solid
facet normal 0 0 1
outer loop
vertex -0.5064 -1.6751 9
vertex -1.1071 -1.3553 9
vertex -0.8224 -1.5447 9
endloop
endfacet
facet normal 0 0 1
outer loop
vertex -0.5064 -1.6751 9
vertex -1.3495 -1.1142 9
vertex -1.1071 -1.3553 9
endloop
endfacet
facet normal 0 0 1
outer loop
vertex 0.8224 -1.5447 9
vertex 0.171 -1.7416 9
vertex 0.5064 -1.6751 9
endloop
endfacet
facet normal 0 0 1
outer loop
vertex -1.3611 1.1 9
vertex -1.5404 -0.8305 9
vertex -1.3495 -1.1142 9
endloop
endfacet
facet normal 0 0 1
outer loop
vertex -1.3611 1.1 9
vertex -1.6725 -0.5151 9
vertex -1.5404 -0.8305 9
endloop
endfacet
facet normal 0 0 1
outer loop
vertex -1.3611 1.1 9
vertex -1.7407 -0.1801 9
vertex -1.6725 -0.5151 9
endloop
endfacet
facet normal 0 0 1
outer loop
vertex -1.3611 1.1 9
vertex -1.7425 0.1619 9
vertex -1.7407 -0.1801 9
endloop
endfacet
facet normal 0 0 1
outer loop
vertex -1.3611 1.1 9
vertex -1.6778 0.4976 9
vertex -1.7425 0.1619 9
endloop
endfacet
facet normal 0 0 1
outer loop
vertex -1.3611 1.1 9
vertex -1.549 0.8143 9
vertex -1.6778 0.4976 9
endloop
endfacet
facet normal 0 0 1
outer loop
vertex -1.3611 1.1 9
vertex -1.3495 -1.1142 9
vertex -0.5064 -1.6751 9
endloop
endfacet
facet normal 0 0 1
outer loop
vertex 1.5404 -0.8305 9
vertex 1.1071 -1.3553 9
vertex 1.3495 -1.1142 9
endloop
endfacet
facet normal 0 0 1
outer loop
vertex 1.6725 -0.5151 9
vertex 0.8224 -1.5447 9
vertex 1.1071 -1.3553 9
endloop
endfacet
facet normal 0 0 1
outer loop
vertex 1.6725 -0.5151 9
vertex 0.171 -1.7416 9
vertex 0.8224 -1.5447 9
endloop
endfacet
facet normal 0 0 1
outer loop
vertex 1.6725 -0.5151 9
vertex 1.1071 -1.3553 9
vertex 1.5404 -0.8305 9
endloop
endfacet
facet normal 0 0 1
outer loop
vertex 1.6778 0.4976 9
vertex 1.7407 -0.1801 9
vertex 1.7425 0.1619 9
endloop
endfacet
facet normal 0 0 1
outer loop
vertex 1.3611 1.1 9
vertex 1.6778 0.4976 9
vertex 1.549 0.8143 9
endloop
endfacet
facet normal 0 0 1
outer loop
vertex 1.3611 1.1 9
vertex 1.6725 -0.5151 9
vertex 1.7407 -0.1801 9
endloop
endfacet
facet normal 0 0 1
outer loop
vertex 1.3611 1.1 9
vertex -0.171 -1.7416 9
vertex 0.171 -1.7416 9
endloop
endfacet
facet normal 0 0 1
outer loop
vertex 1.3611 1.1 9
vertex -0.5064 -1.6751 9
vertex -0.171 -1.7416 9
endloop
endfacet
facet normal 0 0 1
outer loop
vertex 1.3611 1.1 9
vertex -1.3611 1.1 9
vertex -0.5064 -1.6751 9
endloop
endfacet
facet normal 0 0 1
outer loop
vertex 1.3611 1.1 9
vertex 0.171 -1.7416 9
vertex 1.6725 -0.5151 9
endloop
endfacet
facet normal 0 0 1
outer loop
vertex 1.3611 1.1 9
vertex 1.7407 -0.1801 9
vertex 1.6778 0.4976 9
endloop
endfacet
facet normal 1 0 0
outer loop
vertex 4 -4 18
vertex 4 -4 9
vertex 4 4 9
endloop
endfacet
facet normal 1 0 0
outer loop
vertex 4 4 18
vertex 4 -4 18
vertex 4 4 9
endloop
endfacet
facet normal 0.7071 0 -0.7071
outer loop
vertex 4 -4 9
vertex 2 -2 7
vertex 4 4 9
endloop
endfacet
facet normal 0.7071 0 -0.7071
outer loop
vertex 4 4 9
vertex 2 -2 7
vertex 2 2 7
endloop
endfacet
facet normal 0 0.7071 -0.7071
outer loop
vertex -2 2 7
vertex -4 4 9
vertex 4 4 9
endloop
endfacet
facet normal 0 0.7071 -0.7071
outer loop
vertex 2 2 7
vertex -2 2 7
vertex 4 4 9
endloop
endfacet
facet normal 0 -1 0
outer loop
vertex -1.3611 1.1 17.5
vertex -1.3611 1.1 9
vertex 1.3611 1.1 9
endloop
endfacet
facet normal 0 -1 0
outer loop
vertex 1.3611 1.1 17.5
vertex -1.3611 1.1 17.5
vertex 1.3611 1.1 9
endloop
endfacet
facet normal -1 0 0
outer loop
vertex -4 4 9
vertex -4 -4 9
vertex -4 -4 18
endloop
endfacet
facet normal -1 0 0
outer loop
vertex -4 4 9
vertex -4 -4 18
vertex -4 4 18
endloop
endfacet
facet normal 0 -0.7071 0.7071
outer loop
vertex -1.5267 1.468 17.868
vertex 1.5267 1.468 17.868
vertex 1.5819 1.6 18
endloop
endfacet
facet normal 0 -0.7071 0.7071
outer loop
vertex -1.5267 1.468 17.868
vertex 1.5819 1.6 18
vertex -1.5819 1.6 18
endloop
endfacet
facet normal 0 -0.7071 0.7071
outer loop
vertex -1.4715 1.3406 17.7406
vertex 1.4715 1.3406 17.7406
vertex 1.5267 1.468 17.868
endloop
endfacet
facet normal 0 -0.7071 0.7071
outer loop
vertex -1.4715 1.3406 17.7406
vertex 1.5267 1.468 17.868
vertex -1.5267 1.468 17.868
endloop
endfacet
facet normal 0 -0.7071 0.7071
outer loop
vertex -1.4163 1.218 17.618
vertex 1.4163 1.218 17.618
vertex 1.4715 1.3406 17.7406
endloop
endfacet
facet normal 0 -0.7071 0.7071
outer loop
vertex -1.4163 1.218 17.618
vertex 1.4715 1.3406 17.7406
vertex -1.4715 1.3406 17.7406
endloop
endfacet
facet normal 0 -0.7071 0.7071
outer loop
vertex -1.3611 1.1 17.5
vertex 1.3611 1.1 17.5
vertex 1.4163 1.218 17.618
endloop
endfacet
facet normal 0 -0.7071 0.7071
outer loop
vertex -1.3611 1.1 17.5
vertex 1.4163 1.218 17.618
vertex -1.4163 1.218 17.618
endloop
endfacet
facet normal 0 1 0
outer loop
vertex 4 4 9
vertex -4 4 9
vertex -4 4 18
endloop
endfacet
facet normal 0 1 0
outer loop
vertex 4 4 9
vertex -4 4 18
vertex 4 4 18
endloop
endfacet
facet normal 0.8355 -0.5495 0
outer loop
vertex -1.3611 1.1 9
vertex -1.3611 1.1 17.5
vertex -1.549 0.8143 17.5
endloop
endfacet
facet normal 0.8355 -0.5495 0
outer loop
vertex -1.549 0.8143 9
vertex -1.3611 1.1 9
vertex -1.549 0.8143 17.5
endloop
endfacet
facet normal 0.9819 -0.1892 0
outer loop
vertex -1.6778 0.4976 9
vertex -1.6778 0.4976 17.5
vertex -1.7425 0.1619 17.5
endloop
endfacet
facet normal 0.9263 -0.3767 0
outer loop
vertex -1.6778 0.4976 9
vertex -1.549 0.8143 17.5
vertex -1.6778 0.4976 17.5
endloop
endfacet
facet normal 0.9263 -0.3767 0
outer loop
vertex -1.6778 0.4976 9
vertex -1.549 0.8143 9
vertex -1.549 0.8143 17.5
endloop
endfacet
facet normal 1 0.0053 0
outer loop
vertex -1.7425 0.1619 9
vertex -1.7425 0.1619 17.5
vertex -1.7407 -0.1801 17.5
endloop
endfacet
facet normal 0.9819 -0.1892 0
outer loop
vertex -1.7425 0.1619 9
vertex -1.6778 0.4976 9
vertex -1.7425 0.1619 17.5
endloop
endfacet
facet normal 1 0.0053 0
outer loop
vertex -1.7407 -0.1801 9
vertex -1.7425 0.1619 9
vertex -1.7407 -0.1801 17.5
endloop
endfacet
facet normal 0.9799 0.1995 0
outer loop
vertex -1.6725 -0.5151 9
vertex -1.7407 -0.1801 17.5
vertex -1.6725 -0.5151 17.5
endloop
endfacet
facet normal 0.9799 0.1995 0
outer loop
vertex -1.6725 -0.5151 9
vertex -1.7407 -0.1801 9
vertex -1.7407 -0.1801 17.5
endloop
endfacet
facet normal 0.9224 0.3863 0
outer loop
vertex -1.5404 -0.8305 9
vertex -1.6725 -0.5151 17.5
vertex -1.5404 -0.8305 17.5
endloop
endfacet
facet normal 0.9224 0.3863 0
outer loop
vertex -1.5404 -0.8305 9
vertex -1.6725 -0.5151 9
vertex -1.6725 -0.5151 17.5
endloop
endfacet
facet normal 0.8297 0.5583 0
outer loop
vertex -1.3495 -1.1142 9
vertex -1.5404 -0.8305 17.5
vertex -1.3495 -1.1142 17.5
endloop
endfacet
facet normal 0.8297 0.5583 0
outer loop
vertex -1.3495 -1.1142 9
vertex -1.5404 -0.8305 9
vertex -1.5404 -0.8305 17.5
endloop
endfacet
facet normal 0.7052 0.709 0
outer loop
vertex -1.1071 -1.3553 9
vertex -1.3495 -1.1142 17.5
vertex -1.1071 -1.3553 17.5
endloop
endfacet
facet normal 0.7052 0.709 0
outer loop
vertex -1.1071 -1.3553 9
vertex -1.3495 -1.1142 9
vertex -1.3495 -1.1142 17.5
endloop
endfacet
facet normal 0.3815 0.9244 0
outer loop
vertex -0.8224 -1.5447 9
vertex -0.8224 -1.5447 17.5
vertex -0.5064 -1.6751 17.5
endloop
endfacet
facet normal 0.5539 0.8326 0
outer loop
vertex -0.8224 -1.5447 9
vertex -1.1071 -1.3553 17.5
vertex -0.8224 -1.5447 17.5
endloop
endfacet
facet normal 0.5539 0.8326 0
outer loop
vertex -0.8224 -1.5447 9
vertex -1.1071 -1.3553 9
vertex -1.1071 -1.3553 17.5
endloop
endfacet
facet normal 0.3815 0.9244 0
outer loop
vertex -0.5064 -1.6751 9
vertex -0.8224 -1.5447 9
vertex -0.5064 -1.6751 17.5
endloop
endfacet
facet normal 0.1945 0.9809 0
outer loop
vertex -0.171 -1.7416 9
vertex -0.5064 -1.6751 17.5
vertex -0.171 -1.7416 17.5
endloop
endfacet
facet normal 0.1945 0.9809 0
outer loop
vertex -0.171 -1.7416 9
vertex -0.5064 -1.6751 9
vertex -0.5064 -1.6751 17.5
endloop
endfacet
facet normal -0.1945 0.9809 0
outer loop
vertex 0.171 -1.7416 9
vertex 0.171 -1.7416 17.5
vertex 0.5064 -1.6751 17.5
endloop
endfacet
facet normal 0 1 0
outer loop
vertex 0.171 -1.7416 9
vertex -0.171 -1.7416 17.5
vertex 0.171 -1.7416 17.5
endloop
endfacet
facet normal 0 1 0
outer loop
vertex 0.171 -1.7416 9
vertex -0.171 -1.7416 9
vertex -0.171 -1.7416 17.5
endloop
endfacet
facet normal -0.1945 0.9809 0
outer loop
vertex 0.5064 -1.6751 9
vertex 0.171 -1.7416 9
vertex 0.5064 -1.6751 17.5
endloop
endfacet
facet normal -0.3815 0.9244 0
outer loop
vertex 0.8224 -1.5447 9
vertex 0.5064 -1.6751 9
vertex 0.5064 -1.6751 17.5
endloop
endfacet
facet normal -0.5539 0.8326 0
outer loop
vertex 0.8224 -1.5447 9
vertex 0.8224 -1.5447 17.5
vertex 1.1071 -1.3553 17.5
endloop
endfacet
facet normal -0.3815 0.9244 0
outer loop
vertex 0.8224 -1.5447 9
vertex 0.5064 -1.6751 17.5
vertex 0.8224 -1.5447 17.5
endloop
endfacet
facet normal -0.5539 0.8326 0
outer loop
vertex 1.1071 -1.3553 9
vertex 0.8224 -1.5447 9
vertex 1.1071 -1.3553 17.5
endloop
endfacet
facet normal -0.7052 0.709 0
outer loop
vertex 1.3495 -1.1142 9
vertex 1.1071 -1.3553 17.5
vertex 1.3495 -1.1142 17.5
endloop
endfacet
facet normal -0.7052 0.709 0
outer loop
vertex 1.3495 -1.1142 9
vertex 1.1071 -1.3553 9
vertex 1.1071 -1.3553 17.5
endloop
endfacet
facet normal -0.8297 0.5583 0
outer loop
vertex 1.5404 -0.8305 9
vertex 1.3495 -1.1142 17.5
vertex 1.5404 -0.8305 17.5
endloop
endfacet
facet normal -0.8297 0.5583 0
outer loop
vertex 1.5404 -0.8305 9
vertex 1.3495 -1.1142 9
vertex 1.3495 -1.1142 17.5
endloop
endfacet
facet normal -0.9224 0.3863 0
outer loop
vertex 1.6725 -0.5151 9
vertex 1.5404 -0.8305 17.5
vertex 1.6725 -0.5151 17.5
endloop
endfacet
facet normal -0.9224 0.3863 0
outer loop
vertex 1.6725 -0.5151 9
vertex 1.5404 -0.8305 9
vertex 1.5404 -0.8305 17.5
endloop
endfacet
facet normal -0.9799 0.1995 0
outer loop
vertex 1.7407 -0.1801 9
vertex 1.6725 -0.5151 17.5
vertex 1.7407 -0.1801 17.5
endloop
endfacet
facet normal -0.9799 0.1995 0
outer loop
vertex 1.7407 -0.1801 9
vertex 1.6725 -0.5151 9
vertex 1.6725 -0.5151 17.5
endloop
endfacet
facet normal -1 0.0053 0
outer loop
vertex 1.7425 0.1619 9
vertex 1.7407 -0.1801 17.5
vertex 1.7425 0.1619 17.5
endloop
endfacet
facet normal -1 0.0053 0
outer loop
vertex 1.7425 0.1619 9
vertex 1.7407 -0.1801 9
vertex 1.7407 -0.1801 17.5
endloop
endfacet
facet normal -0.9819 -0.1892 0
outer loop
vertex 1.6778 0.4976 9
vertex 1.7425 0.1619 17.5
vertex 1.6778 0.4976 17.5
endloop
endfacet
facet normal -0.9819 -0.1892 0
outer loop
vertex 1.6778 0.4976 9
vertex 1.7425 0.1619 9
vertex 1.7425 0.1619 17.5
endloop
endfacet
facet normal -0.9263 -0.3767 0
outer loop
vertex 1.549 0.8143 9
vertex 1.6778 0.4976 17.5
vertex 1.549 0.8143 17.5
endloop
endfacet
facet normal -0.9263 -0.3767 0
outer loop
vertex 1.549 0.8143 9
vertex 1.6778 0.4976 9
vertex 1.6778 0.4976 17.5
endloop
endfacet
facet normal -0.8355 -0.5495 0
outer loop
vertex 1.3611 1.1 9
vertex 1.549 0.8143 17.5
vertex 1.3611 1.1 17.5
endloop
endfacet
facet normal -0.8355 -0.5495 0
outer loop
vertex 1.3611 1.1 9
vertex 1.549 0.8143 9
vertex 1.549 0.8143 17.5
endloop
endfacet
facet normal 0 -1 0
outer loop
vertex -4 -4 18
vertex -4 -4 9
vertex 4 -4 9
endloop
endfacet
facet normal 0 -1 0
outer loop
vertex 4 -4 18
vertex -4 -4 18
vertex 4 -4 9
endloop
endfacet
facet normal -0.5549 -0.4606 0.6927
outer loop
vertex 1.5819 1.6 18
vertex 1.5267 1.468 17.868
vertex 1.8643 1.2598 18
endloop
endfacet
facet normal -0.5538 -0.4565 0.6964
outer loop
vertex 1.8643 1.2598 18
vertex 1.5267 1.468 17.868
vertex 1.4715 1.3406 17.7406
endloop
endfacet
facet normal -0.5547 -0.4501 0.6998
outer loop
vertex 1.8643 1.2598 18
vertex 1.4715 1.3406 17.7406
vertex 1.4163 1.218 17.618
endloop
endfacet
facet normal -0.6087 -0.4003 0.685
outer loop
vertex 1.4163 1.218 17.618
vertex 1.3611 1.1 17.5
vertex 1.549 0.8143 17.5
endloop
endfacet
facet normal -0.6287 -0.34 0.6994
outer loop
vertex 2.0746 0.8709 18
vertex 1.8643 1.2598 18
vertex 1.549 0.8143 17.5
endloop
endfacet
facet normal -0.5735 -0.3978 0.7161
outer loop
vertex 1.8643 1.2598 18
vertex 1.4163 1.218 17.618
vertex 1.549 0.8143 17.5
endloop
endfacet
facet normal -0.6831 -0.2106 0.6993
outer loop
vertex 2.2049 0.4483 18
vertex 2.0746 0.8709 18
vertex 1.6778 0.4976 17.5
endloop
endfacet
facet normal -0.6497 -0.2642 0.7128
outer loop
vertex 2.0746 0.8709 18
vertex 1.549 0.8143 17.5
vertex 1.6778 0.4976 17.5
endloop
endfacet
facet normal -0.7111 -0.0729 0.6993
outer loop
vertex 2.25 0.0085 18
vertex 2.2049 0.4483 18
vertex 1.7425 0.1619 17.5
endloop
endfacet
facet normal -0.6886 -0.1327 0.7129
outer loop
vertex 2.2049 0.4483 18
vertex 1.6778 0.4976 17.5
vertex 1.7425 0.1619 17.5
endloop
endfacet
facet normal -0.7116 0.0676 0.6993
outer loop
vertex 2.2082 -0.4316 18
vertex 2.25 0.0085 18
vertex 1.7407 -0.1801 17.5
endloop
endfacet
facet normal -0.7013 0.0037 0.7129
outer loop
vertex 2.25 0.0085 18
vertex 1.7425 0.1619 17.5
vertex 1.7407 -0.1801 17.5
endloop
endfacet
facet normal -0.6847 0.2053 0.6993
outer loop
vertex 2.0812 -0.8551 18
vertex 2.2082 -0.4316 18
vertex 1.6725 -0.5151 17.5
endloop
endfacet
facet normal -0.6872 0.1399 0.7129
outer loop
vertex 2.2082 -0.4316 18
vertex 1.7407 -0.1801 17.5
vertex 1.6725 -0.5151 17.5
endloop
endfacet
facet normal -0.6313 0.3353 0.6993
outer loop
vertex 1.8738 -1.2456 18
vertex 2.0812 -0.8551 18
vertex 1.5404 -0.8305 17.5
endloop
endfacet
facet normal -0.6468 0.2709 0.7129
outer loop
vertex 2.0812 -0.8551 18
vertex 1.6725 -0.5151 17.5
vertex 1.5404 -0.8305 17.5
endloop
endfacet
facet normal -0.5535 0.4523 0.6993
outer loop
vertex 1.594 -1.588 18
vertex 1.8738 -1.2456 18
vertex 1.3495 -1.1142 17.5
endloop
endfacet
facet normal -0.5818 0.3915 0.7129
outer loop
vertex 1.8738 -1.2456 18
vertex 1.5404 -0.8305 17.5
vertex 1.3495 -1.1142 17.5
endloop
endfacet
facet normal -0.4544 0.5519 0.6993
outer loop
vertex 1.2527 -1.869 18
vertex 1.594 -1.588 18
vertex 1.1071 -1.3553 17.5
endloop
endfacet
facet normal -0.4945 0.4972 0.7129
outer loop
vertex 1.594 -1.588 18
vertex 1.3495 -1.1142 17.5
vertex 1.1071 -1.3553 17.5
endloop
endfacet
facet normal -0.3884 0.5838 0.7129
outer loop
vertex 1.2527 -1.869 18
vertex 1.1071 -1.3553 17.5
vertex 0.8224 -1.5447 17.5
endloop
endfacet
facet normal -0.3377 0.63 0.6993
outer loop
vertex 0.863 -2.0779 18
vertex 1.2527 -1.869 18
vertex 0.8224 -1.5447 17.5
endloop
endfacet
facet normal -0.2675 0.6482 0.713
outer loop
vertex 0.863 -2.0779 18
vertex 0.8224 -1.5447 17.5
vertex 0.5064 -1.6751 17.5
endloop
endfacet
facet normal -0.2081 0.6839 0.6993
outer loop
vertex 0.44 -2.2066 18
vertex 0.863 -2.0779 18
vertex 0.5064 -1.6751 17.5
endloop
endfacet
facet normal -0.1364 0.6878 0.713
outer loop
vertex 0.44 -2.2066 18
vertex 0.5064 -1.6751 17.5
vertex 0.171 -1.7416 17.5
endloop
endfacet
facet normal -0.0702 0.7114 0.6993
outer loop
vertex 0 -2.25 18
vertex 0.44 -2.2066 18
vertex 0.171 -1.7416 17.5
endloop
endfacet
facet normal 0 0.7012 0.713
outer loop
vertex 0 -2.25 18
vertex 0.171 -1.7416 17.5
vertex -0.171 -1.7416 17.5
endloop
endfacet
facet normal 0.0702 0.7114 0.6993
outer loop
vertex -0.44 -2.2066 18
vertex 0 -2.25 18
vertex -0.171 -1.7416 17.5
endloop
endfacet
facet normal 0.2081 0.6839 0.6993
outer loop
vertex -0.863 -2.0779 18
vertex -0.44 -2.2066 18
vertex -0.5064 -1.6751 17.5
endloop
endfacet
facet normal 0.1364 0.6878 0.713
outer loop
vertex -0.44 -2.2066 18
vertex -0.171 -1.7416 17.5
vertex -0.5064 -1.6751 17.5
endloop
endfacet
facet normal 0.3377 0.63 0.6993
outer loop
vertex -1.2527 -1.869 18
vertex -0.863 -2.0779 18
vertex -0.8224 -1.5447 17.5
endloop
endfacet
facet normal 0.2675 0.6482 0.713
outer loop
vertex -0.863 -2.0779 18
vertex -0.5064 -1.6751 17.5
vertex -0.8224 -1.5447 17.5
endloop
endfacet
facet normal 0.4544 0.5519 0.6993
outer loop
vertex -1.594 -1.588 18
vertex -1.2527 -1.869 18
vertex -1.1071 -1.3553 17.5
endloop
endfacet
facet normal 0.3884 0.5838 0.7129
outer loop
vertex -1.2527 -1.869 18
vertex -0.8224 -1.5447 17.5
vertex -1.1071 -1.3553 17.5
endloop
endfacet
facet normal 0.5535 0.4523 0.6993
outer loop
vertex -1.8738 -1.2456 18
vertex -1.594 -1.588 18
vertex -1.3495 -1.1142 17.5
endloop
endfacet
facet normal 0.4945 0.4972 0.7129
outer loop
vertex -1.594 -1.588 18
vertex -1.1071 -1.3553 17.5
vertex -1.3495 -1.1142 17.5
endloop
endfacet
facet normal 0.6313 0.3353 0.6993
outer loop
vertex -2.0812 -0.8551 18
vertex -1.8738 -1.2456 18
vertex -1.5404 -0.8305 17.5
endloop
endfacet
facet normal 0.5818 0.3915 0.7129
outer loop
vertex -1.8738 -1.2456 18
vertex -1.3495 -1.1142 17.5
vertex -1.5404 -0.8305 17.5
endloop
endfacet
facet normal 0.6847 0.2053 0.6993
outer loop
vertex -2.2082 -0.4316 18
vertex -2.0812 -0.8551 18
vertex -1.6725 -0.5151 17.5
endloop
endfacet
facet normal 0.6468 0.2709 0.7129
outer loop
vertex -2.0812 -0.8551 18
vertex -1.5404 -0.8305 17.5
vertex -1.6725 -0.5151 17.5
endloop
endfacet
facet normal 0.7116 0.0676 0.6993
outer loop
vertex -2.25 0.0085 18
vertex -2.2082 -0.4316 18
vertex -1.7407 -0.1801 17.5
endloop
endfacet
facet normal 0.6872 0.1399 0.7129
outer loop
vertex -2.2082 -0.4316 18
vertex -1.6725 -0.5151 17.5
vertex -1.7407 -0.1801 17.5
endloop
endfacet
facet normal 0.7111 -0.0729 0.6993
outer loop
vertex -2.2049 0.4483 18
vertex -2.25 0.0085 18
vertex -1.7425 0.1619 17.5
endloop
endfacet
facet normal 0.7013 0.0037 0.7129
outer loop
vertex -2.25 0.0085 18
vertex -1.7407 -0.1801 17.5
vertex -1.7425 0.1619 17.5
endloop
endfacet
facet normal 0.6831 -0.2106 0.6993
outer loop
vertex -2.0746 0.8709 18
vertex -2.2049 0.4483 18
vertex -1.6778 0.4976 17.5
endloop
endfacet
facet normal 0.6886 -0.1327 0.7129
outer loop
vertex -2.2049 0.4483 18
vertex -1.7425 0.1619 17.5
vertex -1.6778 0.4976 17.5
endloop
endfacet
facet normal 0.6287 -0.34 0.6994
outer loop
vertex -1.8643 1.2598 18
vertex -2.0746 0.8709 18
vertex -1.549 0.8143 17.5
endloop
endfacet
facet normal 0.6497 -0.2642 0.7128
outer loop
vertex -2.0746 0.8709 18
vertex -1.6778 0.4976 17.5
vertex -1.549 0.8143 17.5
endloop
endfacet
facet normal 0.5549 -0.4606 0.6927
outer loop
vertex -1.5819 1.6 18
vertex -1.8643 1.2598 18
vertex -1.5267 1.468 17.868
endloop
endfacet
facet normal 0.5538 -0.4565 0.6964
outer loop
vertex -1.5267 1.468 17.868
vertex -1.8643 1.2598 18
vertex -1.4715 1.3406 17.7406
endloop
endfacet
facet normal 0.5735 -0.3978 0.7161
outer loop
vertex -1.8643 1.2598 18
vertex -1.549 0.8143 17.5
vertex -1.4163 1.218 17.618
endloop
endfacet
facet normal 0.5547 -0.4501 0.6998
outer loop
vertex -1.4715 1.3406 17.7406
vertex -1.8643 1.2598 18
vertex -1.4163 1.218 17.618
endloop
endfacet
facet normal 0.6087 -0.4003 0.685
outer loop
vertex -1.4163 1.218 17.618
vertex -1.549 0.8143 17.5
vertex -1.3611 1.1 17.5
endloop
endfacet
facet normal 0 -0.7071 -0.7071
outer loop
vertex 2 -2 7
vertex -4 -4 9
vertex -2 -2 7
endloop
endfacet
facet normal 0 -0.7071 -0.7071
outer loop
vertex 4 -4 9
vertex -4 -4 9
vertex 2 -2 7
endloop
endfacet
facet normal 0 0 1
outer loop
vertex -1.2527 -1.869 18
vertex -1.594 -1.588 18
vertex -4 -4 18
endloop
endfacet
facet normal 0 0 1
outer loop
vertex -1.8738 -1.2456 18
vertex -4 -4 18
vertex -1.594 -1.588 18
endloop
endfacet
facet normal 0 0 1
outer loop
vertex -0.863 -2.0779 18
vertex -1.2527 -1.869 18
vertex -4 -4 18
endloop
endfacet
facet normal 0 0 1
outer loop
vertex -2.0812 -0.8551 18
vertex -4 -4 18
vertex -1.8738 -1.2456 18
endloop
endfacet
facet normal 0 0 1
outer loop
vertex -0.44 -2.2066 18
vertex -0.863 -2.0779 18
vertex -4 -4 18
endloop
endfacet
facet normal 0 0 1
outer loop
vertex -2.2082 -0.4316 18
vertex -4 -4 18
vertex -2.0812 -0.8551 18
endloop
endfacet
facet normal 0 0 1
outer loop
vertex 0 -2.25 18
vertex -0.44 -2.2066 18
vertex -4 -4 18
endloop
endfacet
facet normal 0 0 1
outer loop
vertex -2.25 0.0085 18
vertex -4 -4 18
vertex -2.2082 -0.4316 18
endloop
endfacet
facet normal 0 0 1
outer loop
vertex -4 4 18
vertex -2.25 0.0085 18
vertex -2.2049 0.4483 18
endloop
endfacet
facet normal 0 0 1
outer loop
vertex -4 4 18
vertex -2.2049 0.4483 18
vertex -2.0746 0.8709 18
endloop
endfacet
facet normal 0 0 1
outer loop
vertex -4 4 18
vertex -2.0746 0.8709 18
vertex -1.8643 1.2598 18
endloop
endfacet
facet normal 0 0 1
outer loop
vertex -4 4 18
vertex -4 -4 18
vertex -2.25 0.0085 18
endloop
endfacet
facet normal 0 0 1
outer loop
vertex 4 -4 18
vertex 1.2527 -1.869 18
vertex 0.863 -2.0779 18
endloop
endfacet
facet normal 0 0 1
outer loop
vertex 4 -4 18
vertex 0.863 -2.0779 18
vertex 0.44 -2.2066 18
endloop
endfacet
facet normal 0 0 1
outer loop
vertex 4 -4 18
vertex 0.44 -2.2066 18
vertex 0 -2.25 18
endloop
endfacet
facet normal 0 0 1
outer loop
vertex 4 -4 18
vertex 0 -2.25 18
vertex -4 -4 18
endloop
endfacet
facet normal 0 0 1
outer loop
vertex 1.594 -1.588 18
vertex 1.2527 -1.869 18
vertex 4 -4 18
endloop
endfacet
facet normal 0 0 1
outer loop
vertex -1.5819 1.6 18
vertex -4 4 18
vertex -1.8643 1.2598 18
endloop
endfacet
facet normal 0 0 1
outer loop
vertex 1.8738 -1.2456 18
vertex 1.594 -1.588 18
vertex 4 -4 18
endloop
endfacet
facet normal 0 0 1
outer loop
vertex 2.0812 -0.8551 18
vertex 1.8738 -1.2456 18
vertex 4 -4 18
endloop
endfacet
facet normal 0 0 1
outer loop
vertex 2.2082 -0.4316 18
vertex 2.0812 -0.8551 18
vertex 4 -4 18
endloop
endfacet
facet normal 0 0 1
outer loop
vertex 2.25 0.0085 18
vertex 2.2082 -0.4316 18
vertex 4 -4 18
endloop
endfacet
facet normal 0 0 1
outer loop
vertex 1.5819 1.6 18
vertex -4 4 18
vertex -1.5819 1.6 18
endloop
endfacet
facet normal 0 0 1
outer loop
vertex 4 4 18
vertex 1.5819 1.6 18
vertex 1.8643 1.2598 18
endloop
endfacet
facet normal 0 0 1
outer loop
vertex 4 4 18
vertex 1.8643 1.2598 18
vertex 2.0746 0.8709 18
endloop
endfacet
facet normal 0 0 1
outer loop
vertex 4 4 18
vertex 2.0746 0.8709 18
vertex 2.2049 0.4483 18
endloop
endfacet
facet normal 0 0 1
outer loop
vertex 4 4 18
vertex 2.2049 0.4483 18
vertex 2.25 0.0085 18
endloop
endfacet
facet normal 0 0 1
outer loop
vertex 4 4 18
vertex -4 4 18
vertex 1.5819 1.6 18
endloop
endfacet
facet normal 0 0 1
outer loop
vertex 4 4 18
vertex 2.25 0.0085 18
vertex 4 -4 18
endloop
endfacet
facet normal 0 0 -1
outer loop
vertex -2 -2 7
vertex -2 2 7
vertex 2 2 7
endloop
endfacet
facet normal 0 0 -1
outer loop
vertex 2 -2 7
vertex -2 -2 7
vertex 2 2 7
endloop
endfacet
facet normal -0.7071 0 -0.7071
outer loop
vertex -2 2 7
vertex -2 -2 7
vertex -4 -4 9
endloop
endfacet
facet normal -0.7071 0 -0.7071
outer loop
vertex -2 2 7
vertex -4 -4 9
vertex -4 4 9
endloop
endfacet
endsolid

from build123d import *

# Parameters (mm, degrees)
BOX406008008_W     = 10
BOX406008008_H     = 10
BOX406008008_DEPTH = 19
CYLINDER079_R      = 1.75
CYLINDER079_DEPTH  = 17
BOX406008009_W     = 8
BOX406008009_H     = 8
BOX406008009_DEPTH = 11
CHAMFER004_SIZE    = 2
CHAMFER008_SIZE    = 0.5


with BuildPart() as cube343:
    # Box406008008 → Box406008008 (new body)
    with BuildSketch(Plane(origin=(-5, 1.1, 1.5), x_dir=(1, 0, 0), z_dir=(0, 0, 1))):
        with Locations((5, 5)):
            Rectangle(BOX406008008_W, BOX406008008_H)
    extrude(amount=BOX406008008_DEPTH)


with BuildPart() as motor_shaft_hole:
    # Cylinder079 → Cylinder079 (new body)
    with BuildSketch(Plane.XY.offset(9)):
        Circle(CYLINDER079_R)
    extrude(amount=CYLINDER079_DEPTH)

    # Cut064: cut Cube343
    add(cube343.part, mode=Mode.SUBTRACT)


with BuildPart() as chamfer008:
    # Box406008009 → Box406008009 (new body)
    with BuildSketch(Plane(origin=(-4, -4, 7), x_dir=(1, 0, 0), z_dir=(0, 0, 1))):
        with Locations((4, 4)):
            Rectangle(BOX406008009_W, BOX406008009_H)
    extrude(amount=BOX406008009_DEPTH)

    # Cut065: cut Motor Shaft Hole
    add(motor_shaft_hole.part, mode=Mode.SUBTRACT)

    # Chamfer004
    chamfer004_edges = [chamfer008.edges().sort_by_distance(p)[0] for p in [
        (-4, 0, 7),
        (0, -4, 7),
        (0, 4, 7),
        (4, 0, 7),
    ]]
    chamfer(chamfer004_edges, length=CHAMFER004_SIZE)

    # Chamfer008
    chamfer008_edges = [chamfer008.edges().sort_by_distance(p)[0] for p in [
        (1.649904, 0.583367, 18),
        (0, 1.1, 18),
        (-0.583367, -1.649904, 18),
    ]]
    chamfer(chamfer008_edges, length=CHAMFER008_SIZE)


solid = chamfer008.part
